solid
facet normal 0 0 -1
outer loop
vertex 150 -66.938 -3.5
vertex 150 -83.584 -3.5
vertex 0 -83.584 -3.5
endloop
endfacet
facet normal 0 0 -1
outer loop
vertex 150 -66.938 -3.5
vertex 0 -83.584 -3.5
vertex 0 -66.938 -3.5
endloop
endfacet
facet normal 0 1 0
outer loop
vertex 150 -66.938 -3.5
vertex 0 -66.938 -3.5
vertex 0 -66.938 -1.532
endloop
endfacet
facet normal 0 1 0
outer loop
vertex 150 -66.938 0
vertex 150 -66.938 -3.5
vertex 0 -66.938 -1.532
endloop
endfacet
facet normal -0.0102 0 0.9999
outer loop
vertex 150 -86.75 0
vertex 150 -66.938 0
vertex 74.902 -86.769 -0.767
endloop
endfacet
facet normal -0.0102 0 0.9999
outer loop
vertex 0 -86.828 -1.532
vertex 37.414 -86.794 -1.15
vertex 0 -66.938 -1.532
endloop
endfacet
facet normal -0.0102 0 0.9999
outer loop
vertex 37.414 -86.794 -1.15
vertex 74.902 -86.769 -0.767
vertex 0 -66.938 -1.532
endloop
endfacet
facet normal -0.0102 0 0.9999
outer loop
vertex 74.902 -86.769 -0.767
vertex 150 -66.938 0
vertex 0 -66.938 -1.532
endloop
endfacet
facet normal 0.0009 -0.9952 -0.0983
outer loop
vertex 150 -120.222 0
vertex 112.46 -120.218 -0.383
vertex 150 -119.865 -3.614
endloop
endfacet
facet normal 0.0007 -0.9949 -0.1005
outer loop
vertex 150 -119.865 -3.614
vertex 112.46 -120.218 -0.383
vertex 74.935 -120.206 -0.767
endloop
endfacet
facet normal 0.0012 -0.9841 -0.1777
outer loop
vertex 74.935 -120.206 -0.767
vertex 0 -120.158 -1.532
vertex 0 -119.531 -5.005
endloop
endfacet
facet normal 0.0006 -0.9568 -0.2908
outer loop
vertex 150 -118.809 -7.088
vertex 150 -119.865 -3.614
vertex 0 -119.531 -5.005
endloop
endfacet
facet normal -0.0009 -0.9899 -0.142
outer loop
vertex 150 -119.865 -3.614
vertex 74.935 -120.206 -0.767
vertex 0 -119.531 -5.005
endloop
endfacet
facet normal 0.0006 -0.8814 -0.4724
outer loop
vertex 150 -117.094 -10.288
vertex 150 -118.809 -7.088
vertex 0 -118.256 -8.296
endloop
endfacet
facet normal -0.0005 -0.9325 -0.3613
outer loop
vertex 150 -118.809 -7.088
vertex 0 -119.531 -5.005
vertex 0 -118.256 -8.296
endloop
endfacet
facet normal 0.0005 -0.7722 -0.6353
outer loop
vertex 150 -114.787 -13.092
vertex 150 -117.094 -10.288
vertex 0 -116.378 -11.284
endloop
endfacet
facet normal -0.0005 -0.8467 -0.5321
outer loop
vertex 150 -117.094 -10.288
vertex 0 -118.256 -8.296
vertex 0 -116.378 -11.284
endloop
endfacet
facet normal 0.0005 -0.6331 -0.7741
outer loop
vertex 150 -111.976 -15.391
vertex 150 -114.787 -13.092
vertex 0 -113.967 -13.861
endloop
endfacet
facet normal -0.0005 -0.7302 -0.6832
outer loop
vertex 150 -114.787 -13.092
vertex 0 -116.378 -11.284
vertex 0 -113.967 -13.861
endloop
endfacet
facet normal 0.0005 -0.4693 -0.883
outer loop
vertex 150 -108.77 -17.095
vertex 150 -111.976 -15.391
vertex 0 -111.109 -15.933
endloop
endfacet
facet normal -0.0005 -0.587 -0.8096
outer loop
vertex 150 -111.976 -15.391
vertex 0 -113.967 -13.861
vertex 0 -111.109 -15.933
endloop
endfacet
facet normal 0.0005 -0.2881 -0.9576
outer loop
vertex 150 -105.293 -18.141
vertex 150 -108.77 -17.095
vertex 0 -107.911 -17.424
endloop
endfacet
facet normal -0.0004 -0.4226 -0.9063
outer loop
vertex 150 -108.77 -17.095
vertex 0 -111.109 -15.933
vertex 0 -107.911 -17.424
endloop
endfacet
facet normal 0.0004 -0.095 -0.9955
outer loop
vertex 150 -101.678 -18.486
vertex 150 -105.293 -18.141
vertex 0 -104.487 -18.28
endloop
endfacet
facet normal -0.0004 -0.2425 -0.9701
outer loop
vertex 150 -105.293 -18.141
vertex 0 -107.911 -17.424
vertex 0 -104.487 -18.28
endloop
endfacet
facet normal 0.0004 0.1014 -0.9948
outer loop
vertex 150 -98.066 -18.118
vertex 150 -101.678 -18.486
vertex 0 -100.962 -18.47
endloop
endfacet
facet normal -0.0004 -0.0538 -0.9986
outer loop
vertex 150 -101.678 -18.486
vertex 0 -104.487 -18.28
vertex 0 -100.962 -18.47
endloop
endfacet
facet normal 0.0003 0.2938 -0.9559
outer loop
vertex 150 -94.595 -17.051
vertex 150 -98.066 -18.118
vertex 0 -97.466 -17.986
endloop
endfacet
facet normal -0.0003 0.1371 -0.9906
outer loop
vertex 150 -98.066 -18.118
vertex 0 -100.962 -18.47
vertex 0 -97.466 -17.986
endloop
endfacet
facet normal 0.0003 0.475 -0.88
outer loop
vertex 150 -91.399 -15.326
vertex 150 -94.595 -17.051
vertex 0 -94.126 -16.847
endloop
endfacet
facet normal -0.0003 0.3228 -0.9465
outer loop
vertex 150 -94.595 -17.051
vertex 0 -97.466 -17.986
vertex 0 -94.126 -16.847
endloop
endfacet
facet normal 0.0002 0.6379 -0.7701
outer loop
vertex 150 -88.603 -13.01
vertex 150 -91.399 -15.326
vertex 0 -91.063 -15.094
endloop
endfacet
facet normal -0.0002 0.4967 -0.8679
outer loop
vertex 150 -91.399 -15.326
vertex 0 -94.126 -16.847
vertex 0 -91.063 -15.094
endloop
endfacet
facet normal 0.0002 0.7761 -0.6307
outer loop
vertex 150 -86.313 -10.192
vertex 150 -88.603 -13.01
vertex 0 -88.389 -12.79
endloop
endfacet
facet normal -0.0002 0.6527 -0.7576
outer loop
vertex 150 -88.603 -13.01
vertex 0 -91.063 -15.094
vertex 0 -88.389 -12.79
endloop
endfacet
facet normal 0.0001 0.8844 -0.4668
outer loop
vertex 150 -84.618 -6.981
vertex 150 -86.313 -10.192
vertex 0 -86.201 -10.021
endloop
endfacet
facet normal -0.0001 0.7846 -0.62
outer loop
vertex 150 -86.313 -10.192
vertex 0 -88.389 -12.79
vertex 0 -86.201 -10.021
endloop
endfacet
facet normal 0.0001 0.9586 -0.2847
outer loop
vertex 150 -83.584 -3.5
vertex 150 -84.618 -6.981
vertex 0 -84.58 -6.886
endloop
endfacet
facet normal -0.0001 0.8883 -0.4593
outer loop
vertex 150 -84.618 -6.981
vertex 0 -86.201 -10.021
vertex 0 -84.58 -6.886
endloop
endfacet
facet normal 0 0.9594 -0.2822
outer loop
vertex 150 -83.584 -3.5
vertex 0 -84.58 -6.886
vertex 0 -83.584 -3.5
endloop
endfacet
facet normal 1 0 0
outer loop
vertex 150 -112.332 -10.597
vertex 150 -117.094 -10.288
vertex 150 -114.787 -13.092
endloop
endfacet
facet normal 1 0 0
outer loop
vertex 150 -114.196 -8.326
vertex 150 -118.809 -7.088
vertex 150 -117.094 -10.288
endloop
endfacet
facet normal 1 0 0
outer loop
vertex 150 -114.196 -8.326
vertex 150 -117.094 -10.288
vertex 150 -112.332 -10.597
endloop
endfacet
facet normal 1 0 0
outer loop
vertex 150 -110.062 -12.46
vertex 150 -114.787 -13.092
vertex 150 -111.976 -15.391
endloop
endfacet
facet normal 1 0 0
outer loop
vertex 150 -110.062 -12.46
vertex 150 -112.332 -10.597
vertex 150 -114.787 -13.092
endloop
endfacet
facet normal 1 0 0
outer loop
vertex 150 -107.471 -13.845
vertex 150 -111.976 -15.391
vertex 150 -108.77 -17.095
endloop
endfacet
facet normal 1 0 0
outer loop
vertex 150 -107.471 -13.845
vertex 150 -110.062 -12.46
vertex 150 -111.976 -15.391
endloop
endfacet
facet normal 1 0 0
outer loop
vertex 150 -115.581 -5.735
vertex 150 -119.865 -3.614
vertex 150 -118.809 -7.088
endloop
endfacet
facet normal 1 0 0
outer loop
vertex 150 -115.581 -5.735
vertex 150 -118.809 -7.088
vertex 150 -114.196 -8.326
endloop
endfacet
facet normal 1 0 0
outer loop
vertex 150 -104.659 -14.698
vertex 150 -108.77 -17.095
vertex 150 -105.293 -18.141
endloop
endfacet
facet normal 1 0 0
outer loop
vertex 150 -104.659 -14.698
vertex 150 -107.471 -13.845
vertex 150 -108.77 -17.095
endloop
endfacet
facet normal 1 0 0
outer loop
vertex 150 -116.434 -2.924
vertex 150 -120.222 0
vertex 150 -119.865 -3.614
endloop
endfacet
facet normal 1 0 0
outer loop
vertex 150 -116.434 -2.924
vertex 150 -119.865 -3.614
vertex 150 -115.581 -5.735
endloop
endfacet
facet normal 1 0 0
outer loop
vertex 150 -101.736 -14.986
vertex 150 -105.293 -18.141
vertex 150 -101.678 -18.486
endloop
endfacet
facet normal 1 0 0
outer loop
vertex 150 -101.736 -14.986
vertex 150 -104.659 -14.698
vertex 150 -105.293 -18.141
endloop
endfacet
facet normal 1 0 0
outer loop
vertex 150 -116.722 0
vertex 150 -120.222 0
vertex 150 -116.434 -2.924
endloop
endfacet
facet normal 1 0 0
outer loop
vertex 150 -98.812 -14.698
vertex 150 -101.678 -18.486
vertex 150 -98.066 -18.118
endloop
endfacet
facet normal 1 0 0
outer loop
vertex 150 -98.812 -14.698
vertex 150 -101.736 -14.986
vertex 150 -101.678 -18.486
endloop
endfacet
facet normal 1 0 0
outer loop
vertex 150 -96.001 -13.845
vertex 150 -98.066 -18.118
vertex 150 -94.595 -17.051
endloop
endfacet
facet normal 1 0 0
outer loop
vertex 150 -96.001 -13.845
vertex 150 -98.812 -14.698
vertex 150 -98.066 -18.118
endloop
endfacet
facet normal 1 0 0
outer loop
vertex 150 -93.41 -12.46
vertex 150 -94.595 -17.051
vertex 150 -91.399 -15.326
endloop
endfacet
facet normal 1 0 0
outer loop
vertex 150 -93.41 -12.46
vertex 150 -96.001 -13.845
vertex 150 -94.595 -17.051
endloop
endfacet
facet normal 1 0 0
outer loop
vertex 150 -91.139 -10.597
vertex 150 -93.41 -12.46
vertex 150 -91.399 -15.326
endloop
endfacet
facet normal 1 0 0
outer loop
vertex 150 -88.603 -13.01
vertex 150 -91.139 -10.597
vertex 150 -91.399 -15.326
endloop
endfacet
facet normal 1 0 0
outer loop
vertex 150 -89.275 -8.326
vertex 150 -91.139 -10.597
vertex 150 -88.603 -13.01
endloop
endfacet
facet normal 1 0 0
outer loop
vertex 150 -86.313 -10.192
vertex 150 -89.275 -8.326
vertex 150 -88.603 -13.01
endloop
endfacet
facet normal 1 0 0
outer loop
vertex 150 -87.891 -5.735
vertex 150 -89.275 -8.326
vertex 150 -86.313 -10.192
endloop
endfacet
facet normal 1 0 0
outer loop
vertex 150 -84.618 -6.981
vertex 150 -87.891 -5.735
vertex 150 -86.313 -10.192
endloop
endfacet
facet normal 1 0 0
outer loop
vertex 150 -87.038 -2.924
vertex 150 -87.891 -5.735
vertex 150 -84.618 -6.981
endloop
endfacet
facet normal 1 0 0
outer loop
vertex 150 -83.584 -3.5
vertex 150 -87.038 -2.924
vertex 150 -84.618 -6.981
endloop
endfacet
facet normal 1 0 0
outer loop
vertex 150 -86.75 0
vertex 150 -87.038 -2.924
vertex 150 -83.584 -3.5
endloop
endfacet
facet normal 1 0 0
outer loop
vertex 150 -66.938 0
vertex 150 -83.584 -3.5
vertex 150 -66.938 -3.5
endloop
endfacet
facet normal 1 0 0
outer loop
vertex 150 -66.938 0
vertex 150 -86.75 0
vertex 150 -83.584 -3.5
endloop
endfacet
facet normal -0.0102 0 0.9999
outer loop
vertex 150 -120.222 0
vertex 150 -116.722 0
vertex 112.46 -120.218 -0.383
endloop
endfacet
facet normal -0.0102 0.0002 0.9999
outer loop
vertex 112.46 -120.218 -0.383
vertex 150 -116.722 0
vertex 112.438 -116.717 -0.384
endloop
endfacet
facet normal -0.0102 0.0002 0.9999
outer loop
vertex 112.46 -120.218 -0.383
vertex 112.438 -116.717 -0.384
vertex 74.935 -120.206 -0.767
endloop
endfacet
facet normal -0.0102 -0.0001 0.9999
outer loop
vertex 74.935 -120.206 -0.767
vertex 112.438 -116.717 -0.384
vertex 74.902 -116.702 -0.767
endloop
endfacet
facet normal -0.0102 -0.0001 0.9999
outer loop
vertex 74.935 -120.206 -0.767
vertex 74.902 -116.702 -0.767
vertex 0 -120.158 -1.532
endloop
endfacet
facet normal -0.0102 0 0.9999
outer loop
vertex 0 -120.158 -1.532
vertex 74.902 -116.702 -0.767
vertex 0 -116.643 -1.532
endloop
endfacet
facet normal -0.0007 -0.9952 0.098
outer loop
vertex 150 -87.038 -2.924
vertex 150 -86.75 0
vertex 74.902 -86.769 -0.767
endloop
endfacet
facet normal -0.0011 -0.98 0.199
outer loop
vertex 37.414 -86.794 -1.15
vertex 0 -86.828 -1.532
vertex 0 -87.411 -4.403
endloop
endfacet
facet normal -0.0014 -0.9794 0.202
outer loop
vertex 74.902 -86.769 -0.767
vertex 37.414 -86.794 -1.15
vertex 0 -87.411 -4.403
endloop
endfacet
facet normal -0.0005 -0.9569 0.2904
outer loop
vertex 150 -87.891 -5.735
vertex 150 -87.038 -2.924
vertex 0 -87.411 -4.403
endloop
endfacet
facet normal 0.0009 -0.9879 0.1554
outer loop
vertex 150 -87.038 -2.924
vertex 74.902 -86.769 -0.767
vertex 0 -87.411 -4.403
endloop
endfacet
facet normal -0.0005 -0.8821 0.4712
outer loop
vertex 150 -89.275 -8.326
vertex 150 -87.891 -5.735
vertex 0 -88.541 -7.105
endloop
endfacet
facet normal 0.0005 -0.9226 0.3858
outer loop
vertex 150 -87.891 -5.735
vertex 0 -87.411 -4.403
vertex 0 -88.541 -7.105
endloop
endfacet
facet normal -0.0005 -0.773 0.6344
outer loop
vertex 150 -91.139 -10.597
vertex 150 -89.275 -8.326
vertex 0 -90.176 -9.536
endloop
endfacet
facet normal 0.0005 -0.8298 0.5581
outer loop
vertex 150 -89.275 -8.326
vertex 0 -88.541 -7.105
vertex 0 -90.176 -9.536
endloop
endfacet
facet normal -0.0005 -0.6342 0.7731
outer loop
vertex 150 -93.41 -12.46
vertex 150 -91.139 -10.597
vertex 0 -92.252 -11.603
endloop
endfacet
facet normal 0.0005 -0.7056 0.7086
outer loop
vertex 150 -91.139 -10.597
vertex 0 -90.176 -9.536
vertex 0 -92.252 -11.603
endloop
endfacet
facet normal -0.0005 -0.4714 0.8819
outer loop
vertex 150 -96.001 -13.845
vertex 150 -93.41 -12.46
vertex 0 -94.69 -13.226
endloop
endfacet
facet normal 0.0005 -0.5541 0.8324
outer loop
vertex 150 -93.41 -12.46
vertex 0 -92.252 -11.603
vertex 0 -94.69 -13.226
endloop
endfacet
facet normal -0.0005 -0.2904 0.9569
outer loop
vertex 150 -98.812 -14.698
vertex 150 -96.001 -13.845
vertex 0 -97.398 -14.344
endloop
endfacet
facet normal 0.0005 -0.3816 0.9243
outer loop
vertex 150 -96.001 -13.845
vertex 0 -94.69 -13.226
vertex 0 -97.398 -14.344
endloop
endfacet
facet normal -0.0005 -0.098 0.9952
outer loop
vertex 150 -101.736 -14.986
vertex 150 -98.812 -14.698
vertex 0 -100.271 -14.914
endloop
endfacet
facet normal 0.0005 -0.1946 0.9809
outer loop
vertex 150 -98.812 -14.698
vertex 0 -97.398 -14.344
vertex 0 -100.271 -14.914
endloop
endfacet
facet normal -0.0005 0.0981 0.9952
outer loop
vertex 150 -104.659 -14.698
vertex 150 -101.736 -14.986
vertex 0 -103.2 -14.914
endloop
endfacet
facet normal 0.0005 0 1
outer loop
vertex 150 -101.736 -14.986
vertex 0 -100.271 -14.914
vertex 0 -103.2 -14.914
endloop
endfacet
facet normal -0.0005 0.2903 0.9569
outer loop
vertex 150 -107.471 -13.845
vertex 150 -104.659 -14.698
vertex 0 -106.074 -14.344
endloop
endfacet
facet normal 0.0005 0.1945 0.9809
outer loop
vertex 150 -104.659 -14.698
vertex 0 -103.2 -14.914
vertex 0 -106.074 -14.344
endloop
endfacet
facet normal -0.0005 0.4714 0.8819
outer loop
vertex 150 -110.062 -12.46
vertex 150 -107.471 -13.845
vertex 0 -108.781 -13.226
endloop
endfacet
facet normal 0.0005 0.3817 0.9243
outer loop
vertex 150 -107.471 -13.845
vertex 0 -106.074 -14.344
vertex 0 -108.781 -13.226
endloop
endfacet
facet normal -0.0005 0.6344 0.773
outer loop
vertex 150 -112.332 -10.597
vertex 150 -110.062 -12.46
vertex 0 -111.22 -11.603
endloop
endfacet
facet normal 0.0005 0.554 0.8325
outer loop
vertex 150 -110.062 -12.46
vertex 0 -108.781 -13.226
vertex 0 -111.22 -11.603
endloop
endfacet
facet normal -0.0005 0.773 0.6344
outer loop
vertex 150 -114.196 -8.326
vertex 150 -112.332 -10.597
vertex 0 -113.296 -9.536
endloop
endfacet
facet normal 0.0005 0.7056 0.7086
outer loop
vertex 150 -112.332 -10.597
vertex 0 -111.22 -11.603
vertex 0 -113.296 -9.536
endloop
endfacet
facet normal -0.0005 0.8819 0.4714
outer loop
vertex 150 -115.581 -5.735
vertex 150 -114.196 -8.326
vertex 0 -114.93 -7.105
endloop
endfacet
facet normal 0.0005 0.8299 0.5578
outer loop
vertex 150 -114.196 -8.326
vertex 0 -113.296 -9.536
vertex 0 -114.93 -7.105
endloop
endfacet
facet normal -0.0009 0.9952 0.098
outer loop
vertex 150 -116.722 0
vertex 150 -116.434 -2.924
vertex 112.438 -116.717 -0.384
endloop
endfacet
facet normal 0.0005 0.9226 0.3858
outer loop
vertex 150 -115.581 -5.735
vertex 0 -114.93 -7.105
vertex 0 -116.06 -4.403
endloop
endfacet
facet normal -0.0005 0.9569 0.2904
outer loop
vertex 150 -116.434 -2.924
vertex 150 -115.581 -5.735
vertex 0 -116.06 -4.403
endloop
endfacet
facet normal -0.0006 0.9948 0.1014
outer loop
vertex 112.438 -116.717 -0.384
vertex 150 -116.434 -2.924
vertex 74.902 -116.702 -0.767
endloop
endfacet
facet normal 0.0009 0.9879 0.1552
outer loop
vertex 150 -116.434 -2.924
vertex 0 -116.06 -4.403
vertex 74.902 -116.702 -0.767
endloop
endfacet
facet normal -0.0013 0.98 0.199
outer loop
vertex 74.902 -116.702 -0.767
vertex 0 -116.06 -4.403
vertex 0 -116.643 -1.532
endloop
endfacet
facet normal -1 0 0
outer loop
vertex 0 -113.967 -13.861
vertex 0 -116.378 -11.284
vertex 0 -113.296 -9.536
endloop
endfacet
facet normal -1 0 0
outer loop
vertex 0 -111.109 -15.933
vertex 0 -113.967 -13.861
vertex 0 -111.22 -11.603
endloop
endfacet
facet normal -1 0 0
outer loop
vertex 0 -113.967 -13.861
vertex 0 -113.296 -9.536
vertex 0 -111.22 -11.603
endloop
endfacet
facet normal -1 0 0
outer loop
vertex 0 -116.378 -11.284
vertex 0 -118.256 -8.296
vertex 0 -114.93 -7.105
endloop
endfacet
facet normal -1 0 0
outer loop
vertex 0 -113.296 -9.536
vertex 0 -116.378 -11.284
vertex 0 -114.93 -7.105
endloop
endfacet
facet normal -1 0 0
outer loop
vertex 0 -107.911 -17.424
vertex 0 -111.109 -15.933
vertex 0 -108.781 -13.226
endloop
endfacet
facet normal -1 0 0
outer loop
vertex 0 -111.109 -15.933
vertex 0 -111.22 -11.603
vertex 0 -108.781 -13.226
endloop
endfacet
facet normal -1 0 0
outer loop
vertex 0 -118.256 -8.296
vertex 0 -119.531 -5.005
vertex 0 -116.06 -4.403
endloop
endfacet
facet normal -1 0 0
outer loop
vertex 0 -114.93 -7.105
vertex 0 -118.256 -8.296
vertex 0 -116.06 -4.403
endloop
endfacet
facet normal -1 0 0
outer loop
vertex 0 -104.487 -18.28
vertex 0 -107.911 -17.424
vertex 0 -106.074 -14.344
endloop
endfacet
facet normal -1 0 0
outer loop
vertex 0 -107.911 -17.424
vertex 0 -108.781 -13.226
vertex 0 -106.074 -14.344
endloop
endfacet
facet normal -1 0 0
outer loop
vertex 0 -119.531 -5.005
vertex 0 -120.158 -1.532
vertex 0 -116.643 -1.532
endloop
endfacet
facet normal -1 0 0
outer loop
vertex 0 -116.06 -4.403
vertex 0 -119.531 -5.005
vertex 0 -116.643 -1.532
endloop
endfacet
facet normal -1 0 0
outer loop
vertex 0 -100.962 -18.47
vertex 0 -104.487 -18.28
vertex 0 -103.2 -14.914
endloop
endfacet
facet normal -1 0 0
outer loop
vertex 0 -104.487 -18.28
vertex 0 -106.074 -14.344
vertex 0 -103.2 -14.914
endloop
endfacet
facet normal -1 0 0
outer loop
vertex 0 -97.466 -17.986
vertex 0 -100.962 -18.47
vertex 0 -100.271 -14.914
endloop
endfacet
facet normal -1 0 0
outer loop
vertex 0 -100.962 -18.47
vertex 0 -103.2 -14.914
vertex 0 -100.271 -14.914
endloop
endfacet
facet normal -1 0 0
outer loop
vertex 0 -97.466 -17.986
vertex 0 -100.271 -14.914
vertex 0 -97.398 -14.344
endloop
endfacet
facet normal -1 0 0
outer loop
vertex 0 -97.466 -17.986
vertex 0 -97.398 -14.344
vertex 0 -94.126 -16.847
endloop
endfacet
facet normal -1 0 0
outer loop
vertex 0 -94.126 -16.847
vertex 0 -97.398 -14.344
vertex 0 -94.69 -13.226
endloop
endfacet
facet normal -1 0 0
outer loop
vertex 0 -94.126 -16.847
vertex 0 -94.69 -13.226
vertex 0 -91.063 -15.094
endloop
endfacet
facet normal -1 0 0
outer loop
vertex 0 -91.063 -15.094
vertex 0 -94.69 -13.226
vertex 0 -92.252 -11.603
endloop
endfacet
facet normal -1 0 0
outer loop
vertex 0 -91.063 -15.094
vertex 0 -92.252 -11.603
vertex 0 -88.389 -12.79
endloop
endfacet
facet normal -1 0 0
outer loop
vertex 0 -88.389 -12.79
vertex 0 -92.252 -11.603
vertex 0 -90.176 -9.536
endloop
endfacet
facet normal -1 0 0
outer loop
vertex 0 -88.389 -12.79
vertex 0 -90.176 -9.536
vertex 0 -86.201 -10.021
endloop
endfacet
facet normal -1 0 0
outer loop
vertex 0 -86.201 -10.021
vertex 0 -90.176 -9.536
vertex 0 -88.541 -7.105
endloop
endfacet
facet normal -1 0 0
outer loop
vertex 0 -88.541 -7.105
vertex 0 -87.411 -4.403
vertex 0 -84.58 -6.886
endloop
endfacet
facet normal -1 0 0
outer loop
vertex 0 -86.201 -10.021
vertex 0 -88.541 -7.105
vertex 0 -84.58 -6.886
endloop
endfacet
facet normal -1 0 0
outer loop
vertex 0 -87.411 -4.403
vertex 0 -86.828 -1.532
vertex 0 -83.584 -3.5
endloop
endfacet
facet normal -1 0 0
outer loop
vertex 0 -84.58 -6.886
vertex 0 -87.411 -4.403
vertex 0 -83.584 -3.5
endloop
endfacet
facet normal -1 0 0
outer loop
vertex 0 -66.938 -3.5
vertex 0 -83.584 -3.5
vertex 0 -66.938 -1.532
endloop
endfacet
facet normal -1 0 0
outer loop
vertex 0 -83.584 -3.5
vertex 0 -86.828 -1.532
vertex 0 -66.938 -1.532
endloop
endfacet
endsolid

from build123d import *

# Parameters (mm, degrees)
F1_DEPTH = 149.999954
F3_DEPTH = 78.74


with BuildPart() as f1:
    # F0 (on Right) → F1 (new body)
    with BuildSketch(Plane.YZ):
        with BuildLine():
            ThreePointArc((-86.749771, 0), (-101.735771, -14.986), (-116.721771, 0))
            Line((-116.721771, 0), (-120.221764, 0))
            ThreePointArc((-120.221764, 0), (-103.493734, -18.402215), (-83.584132, -3.499993))
            Line((-83.584132, -3.499993), (-66.937771, -3.499993))
            Line((-66.937771, -3.499993), (-66.937771, 0))
            Line((-66.937771, 0), (-86.749771, 0))
        make_face()
    extrude(amount=F1_DEPTH)

    # F2 (on face) → F3 (cut)
    with BuildSketch(Plane(origin=(0, -66.937771, 0), x_dir=(-1, 0, 0), z_dir=(0, 1, 0))):
        Polygon((0, 0), (-149.999954, 0), (0, -1.531896), align=None)
    extrude(amount=-F3_DEPTH, mode=Mode.SUBTRACT)


solid = f1.part
